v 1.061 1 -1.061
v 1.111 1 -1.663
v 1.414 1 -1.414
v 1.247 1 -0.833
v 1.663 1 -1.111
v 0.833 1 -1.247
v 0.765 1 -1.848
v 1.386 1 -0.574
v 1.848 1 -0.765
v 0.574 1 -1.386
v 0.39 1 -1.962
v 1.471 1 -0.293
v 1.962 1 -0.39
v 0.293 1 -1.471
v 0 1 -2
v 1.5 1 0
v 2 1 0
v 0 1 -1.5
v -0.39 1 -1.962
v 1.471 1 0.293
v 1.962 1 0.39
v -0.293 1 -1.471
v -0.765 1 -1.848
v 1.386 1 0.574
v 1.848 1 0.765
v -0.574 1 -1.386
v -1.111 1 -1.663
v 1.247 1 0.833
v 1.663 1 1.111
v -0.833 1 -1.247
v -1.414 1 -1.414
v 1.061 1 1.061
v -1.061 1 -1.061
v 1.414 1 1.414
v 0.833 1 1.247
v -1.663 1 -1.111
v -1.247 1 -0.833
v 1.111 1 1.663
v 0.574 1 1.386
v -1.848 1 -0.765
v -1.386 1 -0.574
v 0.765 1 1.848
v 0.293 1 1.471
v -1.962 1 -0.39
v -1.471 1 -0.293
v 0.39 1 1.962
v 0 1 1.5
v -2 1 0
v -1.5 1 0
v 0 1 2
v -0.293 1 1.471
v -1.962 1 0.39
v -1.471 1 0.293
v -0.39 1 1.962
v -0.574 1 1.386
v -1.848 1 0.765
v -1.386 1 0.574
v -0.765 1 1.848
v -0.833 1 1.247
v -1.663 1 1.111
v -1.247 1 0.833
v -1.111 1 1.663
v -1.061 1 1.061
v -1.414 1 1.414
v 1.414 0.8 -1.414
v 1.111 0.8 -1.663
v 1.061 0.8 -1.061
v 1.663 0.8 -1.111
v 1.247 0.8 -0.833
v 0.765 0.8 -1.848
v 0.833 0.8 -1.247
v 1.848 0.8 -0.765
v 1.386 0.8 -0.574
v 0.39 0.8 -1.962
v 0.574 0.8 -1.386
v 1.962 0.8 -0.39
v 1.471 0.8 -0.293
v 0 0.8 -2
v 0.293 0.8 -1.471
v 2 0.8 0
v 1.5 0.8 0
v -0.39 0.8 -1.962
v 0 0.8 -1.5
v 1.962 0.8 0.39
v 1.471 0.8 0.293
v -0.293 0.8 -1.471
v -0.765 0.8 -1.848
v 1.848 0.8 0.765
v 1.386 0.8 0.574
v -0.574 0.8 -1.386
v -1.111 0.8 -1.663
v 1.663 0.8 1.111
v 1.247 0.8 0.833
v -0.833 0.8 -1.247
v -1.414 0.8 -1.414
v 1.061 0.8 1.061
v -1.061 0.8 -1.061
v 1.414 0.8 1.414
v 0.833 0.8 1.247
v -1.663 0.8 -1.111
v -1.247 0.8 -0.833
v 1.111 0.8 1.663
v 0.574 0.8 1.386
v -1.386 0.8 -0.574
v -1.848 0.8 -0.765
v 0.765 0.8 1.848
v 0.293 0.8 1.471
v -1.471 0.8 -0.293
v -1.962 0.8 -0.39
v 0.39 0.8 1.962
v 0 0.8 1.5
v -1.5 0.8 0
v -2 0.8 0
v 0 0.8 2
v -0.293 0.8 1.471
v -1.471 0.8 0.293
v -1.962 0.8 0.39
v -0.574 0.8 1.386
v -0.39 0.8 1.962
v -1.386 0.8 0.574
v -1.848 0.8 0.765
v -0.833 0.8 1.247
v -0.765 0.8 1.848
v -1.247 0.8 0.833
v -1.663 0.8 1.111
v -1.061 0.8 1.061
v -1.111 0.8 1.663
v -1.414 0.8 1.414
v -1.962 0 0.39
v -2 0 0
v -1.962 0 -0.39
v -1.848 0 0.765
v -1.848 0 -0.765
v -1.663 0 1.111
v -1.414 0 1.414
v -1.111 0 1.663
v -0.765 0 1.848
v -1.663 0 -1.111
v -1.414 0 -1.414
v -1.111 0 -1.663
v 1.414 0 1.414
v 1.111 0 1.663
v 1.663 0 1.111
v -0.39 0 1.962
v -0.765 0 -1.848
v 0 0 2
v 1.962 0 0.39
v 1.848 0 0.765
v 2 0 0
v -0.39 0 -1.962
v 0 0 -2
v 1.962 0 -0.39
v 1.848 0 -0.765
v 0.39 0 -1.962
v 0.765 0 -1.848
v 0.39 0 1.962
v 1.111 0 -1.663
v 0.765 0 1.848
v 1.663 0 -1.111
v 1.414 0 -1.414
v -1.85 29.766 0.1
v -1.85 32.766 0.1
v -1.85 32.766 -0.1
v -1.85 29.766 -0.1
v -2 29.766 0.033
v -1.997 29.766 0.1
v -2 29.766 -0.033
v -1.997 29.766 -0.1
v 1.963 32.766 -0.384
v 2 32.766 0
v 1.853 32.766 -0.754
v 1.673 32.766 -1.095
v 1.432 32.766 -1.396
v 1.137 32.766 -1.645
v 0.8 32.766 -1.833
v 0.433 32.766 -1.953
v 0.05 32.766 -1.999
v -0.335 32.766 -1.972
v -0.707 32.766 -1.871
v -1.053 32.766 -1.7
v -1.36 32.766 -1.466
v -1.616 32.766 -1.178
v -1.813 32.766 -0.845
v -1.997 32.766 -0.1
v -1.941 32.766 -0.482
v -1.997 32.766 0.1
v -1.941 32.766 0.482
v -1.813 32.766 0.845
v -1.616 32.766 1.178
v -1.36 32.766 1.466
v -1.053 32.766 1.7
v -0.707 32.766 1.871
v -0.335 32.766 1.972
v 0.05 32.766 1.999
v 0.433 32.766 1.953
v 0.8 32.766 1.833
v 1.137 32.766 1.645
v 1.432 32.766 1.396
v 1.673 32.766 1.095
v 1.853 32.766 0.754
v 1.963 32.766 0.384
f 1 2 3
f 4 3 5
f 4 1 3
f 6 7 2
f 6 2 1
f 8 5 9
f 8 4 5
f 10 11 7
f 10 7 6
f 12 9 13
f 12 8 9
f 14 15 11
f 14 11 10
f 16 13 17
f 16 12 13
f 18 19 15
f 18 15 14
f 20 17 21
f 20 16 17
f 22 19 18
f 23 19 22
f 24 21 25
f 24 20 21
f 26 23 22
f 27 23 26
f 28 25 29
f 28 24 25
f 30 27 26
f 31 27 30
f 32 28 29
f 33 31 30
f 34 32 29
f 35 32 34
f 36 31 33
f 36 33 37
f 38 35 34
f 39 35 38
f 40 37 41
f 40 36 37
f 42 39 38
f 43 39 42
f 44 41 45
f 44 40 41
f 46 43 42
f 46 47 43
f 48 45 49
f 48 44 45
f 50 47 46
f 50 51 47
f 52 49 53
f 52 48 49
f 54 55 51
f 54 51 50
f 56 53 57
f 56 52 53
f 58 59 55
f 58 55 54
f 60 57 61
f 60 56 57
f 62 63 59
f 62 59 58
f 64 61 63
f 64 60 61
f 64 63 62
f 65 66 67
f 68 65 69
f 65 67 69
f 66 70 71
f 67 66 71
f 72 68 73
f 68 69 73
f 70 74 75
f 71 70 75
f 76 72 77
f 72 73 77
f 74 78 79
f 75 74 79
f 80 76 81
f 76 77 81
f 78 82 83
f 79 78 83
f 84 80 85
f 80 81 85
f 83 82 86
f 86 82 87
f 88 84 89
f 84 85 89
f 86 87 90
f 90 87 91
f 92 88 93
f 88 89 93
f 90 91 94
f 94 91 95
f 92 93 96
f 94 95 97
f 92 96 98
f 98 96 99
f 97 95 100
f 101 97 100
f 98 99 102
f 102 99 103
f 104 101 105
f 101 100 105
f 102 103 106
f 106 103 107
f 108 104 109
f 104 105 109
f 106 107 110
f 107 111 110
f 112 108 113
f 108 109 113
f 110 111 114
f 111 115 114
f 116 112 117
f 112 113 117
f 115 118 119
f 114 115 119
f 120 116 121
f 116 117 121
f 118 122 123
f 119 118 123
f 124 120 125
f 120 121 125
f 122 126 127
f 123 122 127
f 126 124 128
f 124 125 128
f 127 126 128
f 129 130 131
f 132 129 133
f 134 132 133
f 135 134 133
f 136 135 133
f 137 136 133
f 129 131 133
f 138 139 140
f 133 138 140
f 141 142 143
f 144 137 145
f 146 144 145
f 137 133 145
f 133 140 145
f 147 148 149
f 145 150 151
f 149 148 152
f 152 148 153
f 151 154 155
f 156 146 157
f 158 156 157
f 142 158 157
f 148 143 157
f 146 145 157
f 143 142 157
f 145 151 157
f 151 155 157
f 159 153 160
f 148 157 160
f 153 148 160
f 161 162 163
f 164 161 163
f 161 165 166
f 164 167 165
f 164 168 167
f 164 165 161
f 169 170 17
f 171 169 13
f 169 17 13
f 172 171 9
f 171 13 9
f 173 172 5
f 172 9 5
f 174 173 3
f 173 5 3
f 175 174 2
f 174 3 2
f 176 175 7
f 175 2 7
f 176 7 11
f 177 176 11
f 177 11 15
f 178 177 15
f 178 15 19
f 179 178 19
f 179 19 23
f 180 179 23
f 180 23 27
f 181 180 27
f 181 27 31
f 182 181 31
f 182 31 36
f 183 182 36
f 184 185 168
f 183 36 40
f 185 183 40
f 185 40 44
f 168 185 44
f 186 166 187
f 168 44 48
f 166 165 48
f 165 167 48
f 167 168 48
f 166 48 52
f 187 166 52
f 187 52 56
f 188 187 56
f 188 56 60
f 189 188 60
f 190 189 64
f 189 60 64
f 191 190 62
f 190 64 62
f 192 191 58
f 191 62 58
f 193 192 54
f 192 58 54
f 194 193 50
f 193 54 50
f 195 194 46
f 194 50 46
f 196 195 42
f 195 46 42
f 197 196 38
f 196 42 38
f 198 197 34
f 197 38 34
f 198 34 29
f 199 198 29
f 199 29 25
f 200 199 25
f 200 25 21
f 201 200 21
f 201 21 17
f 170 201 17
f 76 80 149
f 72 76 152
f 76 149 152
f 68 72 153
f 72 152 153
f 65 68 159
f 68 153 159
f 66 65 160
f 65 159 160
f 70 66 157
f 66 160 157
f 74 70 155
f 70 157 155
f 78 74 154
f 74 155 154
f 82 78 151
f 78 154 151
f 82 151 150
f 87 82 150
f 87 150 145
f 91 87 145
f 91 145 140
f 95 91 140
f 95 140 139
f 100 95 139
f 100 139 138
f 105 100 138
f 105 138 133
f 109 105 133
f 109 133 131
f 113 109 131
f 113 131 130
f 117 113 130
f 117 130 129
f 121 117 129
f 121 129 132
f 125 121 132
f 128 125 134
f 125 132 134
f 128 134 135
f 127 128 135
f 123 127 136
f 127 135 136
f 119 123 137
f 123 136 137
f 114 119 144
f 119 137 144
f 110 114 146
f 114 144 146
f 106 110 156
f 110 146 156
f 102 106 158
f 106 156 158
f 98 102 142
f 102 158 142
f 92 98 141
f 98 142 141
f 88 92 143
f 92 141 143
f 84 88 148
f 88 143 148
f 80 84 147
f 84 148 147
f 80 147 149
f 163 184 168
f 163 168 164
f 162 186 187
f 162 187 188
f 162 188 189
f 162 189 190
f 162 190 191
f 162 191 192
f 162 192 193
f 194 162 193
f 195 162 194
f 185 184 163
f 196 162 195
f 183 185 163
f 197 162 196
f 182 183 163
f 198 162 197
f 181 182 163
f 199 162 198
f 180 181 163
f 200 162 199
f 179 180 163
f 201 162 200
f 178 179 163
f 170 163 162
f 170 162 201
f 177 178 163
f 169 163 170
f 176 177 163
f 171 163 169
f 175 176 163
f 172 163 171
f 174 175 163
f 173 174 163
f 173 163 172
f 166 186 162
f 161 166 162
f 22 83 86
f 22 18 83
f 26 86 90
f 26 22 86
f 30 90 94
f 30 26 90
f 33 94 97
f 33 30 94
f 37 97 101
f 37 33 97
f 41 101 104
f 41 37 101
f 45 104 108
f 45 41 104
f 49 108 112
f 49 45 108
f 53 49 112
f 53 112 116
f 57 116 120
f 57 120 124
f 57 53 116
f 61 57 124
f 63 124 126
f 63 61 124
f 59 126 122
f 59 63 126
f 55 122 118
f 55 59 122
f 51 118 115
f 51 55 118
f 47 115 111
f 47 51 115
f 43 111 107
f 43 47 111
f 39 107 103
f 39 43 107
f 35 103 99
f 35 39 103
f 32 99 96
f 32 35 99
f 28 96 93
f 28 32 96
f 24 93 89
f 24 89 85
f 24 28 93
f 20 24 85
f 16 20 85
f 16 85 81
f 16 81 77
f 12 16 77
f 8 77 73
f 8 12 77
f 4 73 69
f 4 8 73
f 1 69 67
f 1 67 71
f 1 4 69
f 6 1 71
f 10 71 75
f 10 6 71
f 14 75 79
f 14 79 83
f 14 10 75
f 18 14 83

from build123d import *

# Parameters (mm, degrees)
SKETCH1_R           = 2
BOSS_EXTRUDE1_DEPTH = 32.766
SKETCH2_W           = 0.5
SKETCH2_H           = 0.2
SKETCH3_W           = 0.15
SKETCH3_H           = 0.2
CUT_EXTRUDE1_DEPTH  = 3


with BuildPart() as part:
    # Sketch1 → Boss-Extrude1 (new body)
    with BuildSketch(Plane(origin=(0, 0, 0), x_dir=(1, 0, 0), z_dir=(0, 1, 0))):
        Circle(SKETCH1_R)
    extrude(amount=BOSS_EXTRUDE1_DEPTH)

    # Sketch2 → Cut-Revolve1 (revolve, cut)
    with BuildSketch(Plane(origin=(0, 0, 0), x_dir=(0, 0, -1), z_dir=(1, 0, 0))):
        with Locations((1.75, 0.9)):
            Rectangle(SKETCH2_W, SKETCH2_H)
    revolve(axis=Axis((0, 0, 0), (0, 1, 0)), mode=Mode.SUBTRACT)

    # Sketch3 → Cut-Extrude1 (cut)
    with BuildSketch(Plane(origin=(0, 32.766, 0), x_dir=(1, 0, 0), z_dir=(0, 1, 0))):
        with Locations((-1.925, 0)):
            Rectangle(SKETCH3_W, SKETCH3_H)
    extrude(amount=-CUT_EXTRUDE1_DEPTH, mode=Mode.SUBTRACT)


solid = part.part
